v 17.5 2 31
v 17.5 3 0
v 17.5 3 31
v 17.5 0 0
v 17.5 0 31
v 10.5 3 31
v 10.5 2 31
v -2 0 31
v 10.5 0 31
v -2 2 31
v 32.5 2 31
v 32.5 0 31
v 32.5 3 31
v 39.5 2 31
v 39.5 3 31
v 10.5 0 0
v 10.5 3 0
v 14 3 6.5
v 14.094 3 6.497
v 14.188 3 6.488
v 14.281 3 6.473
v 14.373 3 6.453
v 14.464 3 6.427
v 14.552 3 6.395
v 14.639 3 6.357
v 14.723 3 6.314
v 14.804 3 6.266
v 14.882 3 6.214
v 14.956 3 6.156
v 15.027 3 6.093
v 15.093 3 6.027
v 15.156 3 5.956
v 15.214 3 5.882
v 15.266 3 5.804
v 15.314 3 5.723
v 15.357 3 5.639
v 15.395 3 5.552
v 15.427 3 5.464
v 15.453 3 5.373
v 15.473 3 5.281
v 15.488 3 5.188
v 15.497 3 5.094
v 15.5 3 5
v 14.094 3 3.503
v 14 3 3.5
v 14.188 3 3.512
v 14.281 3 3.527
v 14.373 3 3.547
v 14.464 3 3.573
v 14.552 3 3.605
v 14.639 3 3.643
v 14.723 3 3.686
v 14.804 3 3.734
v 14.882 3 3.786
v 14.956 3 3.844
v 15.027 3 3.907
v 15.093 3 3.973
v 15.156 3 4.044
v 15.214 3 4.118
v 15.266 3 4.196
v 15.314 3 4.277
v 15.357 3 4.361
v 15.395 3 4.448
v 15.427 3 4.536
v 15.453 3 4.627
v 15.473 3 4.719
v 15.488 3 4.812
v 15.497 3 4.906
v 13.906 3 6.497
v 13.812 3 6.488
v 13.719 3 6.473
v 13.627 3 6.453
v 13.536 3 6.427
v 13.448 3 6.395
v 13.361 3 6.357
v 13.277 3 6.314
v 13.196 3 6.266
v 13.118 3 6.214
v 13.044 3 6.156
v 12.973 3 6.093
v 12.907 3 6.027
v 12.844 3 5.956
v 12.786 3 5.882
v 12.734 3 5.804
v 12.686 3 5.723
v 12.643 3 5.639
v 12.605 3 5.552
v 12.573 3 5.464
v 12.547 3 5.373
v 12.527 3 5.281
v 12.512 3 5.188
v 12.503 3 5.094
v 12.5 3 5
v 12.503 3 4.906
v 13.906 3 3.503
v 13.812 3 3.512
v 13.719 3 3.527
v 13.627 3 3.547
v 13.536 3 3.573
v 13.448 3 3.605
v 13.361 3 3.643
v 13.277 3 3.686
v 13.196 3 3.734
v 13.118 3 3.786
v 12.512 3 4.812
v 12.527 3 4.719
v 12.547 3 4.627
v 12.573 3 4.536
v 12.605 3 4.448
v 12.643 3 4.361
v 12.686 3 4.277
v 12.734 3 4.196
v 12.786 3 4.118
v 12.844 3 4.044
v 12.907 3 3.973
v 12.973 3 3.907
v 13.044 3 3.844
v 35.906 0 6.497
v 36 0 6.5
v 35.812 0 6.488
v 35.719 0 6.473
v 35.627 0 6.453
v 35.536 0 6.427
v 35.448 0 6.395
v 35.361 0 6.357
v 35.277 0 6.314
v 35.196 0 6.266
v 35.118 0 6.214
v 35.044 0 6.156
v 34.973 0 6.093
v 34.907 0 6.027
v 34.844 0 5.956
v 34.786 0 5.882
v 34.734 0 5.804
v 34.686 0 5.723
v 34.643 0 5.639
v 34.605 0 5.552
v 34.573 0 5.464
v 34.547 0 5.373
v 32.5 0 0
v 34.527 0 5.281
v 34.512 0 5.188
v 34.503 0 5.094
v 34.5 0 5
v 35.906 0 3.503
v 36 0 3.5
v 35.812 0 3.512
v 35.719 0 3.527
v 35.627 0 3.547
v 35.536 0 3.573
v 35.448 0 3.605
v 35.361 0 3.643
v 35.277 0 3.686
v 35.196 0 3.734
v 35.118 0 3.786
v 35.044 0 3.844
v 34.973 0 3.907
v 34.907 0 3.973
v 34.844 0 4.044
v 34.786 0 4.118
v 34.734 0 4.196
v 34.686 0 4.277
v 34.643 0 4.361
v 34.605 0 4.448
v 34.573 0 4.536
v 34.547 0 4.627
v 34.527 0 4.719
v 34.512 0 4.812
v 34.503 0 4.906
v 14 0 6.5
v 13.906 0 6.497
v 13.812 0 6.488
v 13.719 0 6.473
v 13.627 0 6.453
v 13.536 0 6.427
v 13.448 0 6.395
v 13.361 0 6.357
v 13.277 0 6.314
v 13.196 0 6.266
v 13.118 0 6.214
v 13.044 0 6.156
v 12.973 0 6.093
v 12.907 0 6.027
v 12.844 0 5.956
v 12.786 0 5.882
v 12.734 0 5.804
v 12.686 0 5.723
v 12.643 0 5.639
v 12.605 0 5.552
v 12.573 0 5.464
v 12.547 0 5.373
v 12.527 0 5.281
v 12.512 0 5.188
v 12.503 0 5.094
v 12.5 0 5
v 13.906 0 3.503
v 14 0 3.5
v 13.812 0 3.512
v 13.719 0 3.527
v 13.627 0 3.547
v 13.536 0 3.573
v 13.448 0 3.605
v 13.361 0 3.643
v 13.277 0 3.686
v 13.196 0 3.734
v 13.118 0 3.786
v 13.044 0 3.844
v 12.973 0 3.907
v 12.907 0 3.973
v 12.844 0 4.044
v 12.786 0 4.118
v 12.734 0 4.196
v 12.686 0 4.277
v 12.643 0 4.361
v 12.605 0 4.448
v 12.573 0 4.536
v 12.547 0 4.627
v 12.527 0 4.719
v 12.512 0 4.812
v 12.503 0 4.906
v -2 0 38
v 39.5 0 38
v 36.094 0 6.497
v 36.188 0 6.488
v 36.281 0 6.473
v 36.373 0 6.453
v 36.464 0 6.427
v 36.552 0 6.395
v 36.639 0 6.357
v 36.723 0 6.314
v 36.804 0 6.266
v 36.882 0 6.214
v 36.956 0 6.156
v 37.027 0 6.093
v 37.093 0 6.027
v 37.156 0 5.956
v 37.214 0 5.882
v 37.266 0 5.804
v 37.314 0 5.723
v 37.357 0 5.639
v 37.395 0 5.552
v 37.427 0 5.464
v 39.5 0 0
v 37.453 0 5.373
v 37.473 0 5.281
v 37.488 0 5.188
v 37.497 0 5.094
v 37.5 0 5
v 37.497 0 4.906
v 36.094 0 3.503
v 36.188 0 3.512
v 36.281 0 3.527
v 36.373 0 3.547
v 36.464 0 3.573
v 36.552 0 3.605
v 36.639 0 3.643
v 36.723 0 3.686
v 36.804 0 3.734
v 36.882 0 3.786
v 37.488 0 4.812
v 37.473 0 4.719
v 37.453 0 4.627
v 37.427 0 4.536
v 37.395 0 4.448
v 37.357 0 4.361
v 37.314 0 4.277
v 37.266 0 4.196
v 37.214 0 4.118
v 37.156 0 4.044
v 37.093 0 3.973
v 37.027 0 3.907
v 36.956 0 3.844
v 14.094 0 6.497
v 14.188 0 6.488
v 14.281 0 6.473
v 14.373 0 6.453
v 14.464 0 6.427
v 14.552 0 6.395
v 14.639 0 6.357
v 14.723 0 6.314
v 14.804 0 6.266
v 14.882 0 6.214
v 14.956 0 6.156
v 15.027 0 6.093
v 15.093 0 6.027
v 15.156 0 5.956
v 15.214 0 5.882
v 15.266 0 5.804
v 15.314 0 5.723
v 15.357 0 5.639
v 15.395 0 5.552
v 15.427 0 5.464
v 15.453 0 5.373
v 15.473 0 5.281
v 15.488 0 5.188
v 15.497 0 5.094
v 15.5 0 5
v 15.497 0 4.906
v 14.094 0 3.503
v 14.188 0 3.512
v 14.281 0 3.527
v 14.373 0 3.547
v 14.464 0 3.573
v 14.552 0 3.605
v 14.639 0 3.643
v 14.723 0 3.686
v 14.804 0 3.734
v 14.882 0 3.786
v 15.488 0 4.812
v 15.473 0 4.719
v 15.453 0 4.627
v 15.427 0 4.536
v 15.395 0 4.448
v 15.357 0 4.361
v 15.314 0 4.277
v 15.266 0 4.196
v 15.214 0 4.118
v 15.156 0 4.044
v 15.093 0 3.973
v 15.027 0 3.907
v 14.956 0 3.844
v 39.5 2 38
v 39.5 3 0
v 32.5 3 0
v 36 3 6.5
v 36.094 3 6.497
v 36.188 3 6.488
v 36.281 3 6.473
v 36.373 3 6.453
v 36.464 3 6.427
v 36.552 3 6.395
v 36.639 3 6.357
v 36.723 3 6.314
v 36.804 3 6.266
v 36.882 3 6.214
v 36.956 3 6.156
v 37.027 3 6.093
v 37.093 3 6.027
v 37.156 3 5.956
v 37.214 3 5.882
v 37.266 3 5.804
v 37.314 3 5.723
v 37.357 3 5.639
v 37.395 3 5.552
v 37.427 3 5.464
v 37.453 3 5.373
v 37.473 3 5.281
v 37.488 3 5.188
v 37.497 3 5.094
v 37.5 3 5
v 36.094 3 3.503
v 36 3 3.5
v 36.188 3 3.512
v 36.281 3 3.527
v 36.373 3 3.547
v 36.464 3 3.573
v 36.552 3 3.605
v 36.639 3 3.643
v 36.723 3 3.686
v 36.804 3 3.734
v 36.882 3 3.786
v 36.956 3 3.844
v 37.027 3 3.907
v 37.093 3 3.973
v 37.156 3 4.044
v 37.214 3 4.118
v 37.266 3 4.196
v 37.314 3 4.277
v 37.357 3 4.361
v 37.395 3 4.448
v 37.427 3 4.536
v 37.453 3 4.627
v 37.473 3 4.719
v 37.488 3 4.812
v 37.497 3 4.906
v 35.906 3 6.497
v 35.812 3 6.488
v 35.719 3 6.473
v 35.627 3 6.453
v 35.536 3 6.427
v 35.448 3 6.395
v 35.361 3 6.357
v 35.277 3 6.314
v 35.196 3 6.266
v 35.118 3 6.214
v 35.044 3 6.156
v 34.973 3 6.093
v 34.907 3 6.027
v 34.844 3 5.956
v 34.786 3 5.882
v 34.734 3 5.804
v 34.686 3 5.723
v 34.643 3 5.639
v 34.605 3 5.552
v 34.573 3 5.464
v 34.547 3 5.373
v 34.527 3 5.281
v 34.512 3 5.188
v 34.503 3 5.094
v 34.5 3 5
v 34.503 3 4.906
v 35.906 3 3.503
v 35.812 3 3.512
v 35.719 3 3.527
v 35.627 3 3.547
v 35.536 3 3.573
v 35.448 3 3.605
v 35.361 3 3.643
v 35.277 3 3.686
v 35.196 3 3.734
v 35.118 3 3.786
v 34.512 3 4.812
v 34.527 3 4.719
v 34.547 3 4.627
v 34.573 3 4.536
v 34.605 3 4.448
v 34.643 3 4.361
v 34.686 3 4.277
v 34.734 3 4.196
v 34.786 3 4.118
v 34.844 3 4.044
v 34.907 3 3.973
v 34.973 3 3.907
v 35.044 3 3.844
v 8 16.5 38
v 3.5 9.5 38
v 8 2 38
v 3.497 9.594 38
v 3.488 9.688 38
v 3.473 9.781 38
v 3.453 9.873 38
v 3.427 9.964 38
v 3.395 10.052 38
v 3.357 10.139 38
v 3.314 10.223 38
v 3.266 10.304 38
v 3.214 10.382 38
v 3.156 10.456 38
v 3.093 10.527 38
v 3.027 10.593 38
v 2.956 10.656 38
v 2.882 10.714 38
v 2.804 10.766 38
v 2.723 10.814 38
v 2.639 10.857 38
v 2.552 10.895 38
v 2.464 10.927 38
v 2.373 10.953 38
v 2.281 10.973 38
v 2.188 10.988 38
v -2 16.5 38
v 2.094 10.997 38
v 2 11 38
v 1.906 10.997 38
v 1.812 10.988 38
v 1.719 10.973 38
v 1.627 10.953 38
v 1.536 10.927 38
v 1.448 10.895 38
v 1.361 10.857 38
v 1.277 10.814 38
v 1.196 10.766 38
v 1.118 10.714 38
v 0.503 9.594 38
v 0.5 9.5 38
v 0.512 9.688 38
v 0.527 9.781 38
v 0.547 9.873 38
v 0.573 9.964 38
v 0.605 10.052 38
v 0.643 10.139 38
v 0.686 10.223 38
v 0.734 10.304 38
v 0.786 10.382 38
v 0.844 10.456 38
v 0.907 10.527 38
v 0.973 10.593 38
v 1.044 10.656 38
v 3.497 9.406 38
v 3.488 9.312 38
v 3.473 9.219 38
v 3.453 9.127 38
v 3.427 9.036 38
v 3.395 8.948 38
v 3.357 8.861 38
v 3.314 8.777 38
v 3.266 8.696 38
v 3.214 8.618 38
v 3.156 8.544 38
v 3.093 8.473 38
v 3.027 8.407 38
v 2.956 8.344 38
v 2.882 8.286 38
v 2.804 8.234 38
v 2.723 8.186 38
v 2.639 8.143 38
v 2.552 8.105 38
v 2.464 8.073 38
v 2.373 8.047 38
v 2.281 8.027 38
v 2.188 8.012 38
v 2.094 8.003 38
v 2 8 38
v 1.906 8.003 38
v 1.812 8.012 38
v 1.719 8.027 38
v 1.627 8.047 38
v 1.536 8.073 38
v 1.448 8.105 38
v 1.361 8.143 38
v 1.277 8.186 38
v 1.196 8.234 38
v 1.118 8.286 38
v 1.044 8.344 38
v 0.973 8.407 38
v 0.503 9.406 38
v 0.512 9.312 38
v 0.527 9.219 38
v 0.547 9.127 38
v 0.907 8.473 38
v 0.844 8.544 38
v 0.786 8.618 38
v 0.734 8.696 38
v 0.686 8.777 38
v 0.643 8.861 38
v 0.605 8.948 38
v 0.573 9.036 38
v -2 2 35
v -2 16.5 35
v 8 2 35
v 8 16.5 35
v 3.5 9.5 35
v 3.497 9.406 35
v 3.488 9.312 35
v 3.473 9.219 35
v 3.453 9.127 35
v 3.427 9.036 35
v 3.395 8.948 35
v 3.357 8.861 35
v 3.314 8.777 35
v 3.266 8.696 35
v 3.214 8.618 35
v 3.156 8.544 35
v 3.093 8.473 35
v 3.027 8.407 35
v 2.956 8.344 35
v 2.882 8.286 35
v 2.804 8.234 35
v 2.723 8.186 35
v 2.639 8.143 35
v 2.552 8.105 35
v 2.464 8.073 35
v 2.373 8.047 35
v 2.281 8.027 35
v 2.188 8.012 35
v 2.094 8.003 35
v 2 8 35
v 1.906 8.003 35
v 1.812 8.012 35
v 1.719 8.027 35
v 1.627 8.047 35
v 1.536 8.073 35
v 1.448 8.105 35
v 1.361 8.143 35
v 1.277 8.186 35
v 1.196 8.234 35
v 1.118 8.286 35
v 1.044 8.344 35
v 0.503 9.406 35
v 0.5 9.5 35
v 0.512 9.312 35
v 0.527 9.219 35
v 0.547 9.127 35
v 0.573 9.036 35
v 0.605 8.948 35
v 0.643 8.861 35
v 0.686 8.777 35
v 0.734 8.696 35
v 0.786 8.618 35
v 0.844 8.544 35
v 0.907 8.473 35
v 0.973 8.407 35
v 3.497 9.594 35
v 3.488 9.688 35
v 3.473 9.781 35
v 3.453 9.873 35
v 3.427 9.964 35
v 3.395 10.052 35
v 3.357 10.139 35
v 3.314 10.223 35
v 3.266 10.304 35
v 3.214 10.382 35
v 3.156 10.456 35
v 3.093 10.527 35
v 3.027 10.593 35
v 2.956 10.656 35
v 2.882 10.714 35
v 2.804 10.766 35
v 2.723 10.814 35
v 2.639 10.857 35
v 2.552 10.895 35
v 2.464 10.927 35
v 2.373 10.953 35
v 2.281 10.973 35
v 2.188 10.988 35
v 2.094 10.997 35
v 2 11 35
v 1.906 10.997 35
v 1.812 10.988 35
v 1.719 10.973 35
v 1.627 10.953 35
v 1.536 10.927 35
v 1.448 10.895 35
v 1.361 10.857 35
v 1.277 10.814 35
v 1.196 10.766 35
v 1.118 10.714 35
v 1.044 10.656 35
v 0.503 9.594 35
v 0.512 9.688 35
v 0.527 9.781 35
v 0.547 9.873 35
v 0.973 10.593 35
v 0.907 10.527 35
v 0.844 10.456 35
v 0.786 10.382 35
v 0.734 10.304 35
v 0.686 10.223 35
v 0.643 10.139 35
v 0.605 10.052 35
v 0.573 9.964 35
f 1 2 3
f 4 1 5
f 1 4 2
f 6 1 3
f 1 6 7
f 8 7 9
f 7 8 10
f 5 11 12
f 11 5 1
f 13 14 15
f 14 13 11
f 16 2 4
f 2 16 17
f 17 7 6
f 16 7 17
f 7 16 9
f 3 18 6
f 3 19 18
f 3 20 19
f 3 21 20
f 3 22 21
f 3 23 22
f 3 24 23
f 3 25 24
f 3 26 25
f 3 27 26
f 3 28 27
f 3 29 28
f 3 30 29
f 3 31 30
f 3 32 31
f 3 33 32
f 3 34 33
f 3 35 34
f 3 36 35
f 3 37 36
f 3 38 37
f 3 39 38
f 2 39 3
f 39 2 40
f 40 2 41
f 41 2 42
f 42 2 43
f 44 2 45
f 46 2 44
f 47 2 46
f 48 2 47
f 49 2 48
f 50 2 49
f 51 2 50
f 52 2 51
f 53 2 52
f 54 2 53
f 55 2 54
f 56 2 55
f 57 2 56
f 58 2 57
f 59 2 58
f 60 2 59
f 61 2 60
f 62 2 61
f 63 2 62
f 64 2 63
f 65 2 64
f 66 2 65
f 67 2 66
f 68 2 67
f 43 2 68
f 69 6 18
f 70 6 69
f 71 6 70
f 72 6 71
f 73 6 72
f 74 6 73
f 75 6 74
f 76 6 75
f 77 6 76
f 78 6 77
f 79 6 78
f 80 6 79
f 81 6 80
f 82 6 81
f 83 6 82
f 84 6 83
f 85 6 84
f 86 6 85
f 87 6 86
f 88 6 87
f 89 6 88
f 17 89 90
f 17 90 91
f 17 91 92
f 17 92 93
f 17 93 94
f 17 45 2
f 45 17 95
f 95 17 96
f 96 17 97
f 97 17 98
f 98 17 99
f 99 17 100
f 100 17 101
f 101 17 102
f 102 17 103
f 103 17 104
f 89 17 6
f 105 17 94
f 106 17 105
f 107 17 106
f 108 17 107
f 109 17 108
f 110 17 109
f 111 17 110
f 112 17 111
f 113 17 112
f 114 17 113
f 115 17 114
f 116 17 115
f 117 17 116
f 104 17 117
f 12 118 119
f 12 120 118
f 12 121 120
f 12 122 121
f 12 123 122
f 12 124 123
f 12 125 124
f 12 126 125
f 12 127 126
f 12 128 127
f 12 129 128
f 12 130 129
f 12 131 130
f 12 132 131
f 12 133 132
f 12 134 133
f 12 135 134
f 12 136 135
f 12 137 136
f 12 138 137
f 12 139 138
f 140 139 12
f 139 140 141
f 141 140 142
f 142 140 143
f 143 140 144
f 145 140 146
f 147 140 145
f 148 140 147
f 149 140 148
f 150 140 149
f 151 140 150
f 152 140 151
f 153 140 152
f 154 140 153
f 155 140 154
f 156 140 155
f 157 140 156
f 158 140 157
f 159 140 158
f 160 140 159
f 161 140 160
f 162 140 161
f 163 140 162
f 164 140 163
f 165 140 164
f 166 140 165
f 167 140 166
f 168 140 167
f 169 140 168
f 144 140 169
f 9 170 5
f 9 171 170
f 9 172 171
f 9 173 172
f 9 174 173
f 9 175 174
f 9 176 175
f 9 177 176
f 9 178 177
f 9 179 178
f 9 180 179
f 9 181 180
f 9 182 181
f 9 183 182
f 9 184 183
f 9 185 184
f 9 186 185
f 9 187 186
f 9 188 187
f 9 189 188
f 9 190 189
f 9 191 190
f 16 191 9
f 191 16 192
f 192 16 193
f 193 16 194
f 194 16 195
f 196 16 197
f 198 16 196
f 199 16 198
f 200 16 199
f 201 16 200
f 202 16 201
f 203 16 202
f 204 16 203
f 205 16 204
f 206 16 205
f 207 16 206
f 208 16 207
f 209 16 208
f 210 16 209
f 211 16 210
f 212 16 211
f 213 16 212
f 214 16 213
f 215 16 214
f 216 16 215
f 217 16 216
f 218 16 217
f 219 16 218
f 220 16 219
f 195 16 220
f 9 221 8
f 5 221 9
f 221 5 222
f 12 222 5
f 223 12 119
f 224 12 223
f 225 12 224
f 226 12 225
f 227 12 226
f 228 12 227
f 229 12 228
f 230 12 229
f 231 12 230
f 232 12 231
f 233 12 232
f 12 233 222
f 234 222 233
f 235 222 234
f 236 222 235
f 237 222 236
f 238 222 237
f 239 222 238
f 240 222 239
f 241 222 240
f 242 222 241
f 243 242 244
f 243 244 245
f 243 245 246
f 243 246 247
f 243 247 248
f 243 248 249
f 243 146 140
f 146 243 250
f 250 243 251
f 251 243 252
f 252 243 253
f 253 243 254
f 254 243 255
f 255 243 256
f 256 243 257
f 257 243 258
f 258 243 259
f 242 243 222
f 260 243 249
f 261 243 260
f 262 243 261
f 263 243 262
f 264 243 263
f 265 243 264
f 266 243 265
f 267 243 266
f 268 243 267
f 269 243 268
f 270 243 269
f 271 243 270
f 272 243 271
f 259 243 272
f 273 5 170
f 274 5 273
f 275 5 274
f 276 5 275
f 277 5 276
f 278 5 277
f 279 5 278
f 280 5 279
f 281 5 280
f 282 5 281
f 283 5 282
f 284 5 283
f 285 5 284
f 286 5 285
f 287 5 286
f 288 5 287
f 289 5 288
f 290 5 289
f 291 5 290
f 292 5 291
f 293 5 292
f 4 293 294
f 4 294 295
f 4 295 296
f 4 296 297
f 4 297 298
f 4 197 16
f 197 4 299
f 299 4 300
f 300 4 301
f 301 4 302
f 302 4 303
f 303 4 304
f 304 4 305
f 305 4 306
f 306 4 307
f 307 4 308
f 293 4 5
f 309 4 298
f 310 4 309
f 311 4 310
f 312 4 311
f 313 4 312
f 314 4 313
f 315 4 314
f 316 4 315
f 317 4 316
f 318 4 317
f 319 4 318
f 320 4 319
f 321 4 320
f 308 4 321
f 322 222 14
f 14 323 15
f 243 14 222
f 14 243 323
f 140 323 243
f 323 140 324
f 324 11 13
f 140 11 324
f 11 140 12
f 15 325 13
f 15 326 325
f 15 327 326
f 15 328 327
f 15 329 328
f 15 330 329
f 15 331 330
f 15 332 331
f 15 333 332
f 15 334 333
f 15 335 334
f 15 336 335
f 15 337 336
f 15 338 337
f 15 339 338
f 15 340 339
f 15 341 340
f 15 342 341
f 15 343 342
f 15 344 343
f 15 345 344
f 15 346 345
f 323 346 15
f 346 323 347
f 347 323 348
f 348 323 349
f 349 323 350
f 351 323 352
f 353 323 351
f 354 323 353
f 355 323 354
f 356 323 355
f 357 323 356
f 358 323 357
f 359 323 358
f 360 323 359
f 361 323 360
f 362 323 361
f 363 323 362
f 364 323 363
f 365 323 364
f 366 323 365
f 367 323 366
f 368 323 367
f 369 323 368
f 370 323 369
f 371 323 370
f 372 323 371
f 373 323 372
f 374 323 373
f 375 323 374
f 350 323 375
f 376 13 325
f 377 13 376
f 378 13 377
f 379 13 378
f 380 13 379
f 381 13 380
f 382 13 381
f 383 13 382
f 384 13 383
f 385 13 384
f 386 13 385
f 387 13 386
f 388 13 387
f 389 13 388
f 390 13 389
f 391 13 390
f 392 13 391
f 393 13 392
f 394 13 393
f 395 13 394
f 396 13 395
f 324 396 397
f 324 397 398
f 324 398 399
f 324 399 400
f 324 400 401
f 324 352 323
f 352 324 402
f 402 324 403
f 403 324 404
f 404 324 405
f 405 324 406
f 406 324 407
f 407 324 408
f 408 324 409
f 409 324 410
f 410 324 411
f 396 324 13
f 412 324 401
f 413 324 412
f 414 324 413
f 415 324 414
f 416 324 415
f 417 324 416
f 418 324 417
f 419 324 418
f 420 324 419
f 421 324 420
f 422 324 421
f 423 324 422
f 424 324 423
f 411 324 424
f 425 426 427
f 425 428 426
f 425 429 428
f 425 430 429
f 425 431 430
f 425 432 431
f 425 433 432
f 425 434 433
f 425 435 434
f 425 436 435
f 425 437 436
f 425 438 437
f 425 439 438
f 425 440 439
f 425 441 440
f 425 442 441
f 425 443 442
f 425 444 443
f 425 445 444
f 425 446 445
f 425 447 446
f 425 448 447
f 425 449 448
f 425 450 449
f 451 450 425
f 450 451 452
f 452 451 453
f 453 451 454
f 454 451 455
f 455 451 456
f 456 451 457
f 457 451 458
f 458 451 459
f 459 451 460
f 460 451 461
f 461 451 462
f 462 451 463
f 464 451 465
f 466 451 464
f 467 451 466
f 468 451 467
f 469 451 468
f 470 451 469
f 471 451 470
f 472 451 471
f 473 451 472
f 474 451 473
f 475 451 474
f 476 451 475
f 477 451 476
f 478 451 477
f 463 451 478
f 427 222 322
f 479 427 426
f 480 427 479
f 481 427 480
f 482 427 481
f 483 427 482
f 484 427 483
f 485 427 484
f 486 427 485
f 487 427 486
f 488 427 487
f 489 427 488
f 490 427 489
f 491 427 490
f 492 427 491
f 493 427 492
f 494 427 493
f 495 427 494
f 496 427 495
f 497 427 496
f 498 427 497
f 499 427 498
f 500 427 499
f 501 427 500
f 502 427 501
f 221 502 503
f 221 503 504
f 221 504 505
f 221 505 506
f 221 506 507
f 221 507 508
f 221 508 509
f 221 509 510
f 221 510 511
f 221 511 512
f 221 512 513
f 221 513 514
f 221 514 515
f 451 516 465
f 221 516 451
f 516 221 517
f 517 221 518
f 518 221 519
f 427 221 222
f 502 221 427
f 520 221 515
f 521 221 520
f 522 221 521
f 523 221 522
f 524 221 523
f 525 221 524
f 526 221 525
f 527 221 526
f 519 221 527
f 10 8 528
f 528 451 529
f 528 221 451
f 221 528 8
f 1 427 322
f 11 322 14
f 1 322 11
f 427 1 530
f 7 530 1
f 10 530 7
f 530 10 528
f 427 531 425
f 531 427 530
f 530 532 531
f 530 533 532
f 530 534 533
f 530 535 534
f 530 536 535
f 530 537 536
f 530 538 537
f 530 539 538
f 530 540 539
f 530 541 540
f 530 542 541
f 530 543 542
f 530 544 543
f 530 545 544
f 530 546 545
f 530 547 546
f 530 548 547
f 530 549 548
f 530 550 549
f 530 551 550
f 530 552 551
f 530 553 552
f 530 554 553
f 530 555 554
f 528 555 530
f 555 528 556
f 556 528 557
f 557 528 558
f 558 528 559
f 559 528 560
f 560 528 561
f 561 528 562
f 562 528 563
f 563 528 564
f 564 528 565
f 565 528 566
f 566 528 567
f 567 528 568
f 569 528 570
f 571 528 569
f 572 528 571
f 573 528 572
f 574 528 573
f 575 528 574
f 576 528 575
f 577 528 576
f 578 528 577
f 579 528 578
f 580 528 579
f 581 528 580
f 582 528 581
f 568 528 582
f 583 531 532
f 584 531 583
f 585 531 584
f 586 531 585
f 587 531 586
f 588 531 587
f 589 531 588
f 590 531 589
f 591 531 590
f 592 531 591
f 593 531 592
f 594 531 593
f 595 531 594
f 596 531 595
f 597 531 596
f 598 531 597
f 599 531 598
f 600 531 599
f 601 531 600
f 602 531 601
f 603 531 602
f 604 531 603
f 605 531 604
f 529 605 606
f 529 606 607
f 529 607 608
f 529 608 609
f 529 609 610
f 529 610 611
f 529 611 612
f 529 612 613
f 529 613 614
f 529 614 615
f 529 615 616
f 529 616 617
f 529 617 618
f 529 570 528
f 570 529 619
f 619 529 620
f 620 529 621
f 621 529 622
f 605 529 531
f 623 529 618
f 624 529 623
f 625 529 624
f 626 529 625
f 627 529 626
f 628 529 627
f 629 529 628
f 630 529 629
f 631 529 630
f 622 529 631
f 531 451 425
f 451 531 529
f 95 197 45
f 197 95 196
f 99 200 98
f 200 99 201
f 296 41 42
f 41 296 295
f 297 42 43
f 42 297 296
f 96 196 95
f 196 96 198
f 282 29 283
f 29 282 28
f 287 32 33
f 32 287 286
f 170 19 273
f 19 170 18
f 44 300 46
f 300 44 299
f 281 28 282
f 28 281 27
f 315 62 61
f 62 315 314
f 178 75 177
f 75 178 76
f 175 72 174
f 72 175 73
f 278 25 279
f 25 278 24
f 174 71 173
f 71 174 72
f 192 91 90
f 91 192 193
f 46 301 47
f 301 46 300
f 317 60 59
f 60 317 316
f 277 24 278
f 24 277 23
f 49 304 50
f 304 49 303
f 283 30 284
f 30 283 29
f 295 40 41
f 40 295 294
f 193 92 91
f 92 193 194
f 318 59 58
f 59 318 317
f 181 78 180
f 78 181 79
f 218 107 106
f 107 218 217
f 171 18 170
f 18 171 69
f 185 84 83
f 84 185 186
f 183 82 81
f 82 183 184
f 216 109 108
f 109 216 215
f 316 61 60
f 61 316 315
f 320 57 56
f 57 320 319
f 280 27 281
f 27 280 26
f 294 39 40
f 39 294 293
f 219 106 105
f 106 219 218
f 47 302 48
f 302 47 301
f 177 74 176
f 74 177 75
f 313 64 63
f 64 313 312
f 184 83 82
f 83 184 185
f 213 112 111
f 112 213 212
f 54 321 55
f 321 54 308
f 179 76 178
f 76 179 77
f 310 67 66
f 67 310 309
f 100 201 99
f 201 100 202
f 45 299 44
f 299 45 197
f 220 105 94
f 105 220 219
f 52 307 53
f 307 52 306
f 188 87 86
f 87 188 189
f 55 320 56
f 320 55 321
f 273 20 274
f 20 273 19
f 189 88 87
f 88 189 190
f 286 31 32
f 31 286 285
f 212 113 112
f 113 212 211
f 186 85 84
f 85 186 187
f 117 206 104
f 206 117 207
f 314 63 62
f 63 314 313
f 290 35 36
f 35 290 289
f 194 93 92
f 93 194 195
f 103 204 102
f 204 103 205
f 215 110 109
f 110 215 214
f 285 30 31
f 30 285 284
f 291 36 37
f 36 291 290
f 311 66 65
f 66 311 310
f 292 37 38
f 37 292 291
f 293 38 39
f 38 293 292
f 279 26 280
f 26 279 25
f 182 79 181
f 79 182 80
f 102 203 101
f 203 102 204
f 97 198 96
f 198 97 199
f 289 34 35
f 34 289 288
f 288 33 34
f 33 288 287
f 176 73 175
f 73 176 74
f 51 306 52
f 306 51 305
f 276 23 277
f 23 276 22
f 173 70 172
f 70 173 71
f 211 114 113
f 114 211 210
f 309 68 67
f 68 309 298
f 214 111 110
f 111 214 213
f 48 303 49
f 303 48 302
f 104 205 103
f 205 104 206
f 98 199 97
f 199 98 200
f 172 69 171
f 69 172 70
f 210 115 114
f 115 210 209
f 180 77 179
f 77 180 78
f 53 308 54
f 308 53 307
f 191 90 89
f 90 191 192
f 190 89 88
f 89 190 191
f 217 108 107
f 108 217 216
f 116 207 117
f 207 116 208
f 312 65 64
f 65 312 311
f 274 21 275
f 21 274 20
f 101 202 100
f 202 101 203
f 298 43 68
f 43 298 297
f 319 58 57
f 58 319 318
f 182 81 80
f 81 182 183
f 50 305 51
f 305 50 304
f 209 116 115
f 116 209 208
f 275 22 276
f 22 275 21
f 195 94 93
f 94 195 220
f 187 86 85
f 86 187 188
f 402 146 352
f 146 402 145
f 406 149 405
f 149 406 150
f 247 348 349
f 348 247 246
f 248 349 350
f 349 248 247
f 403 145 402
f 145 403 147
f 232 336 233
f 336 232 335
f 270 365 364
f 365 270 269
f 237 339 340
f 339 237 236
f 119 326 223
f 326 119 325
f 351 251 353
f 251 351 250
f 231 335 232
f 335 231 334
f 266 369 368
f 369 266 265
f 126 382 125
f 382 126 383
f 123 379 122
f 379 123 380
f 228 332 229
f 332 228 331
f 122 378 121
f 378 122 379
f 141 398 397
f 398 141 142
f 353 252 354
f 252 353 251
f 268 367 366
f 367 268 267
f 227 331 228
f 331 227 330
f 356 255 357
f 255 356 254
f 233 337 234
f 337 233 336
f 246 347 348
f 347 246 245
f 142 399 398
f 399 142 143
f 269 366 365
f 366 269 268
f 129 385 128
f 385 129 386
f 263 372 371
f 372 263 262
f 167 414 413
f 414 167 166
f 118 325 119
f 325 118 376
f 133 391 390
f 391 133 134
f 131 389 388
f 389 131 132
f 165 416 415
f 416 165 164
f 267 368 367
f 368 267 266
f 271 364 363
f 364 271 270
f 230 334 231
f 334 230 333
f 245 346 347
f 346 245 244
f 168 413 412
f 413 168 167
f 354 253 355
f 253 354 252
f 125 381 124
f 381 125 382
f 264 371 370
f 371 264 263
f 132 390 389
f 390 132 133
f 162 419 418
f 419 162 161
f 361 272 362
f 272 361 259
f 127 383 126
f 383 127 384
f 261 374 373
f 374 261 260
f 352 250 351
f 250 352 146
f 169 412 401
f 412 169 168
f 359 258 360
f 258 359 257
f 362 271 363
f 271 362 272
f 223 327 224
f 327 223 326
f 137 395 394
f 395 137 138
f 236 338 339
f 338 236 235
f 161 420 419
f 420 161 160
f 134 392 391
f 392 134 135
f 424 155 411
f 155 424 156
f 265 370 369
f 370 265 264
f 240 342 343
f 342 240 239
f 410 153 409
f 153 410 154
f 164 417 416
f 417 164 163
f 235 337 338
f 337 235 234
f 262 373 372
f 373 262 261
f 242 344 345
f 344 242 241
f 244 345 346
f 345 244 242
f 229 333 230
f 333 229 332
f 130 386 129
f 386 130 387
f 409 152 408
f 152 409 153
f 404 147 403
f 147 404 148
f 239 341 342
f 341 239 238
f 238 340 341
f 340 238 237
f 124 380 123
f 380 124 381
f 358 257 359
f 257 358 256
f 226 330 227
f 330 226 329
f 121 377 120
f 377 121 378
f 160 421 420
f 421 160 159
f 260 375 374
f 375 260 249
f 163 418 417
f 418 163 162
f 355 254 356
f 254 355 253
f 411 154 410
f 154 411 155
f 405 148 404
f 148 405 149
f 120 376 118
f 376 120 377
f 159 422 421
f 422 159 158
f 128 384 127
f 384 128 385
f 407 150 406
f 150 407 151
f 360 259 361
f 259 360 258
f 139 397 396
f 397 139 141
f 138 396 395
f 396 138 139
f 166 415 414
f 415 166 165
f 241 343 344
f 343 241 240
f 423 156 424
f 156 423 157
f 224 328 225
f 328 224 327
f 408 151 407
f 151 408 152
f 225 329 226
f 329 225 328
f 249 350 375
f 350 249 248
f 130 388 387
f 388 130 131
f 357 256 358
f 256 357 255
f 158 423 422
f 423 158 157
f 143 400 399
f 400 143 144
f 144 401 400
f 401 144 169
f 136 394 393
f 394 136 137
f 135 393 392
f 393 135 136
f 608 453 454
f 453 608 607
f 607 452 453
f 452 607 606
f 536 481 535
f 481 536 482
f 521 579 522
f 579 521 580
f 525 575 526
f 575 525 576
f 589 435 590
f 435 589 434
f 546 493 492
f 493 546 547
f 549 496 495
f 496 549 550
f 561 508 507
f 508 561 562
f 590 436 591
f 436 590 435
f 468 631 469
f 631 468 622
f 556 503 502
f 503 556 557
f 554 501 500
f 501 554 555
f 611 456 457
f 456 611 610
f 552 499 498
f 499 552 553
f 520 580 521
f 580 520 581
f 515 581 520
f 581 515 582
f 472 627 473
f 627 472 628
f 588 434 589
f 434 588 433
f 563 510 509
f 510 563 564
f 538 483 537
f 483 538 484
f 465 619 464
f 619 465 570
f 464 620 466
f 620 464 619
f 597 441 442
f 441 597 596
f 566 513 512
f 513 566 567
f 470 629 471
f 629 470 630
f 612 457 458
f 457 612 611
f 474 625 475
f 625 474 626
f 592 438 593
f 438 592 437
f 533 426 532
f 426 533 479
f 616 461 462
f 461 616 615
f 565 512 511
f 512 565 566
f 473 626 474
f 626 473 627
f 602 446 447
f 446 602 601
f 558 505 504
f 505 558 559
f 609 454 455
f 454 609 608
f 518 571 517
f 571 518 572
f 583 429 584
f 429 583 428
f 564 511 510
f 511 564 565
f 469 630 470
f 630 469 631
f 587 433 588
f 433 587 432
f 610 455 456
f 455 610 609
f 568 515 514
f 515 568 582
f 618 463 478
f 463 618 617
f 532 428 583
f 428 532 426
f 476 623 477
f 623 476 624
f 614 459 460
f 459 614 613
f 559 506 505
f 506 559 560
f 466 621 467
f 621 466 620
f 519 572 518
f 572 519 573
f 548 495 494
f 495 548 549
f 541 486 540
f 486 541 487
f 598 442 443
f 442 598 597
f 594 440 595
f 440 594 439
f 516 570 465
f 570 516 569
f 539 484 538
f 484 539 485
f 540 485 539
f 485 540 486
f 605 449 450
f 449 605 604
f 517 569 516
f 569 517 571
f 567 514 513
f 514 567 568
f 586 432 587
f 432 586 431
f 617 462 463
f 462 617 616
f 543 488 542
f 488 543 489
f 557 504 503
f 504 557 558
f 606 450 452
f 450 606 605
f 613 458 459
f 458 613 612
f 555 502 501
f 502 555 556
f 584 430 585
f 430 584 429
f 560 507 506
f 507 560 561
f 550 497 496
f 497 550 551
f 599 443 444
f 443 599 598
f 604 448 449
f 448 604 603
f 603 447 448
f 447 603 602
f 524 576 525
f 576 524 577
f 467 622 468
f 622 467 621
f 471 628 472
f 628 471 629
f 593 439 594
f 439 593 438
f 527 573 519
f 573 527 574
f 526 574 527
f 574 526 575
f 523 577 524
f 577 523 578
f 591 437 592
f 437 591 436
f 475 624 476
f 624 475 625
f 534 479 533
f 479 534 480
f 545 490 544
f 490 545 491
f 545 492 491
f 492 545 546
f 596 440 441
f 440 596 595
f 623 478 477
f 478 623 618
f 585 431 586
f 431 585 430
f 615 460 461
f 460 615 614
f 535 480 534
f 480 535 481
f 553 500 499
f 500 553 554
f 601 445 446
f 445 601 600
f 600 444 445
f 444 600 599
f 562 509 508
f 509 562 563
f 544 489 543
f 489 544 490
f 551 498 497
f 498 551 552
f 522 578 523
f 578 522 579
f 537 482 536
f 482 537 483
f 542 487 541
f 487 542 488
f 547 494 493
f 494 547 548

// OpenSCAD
difference(){
	union(){
        

        translate([10.5,0,0]){
            cube([7,3,31], center=false);
        }         
        translate([32.5,0,0]){
            cube([7,3,31], center=false);
        }         
        translate([-2,0,31]){
            cube([41.5,2,7], center=false);
        }         
        translate([-2,0,35]){
            cube([10,16.5,3], center=false);
        }         
   
        
   

	}
	union() {
        translate([14,30,5]){
            rotate([90,0,0]){
                cylinder(h=99, r=1.5, $fn=100, center=false);
            }
        }       
        translate([36,30,5]){
            rotate([90,0,0]){
                cylinder(h=99, r=1.5, $fn=100, center=false);
            }
        }       
        translate([2,9.5,0]){
            rotate([0,0,90]){
                cylinder(h=99, r=1.5, $fn=100, center=false);
            }
        }       

  

	}
}
